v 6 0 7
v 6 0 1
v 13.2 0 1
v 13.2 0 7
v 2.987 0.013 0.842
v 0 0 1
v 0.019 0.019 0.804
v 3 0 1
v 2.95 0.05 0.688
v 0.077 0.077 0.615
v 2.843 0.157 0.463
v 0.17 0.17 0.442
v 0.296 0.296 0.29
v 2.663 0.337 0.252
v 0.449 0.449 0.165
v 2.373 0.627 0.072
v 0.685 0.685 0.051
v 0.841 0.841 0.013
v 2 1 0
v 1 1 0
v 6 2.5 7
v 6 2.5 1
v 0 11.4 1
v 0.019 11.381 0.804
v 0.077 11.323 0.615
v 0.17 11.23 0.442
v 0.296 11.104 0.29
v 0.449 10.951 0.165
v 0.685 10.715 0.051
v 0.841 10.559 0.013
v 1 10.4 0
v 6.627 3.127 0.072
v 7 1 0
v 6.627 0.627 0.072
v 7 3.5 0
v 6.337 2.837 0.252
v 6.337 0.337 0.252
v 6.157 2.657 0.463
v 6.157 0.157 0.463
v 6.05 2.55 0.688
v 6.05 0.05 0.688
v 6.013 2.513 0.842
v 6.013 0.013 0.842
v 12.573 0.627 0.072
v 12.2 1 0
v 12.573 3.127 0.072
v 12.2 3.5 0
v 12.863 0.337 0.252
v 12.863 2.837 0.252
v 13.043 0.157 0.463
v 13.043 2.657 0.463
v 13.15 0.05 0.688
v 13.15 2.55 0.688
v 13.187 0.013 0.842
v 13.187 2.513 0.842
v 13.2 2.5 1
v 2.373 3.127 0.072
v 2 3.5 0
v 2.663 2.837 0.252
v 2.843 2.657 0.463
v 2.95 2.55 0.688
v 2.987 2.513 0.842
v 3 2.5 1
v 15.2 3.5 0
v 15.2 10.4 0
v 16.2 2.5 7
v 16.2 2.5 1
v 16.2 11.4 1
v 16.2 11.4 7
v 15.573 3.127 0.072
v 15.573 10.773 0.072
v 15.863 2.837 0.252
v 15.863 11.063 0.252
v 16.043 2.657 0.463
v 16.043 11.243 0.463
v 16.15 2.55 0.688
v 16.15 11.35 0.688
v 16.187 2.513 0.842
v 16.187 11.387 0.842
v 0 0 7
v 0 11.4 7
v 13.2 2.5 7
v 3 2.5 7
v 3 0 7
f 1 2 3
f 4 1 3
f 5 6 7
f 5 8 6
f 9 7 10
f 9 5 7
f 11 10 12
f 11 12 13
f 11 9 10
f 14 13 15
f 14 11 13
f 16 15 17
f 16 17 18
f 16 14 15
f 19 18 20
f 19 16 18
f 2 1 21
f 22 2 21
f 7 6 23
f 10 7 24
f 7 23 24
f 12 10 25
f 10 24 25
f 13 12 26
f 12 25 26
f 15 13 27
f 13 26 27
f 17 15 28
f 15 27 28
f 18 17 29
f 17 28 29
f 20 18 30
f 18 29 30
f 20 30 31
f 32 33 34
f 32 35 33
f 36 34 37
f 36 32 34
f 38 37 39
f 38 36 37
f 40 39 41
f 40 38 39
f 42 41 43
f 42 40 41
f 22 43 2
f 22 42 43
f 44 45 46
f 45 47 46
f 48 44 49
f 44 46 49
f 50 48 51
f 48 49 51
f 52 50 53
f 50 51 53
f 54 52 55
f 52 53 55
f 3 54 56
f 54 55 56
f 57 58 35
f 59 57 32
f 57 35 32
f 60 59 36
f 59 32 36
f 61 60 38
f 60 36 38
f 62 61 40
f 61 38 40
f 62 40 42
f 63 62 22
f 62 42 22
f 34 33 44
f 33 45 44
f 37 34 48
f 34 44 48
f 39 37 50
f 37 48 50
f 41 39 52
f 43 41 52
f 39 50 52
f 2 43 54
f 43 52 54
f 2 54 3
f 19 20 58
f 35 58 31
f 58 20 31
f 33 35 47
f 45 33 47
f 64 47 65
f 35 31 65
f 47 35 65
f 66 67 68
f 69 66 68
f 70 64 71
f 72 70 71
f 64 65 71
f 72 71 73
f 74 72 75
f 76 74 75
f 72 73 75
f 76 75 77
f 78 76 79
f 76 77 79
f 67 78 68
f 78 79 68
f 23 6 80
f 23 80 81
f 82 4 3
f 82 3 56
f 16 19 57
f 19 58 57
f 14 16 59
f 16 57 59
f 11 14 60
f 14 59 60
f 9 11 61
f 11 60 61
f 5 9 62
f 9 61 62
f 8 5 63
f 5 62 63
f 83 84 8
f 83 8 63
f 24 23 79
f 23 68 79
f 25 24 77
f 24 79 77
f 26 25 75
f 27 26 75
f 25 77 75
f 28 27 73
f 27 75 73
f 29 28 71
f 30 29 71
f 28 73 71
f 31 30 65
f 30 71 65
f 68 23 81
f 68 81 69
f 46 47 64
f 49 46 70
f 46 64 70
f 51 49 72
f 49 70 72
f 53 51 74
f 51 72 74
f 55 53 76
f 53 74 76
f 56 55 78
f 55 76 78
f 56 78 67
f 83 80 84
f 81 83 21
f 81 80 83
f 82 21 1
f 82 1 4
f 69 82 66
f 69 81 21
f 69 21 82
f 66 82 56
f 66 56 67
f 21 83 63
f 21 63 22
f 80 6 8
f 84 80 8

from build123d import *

# Parameters (mm, degrees)
SKICA1_W                 = 16.2
SKICA1_H                 = 11.4
P_IDAT_VYSUNUT_M1_DEPTH  = 7
SKICA2_W                 = 3
SKICA2_H                 = 2.5
ODEBRAT_VYSUNUT_M1_DEPTH = 8
ZAOBLIT5_R               = 1


with BuildPart() as part:
    # Skica1 → Přidat vysunutím1 (new body)
    with BuildSketch(Plane.XY):
        with Locations((8.1, 5.7)):
            Rectangle(SKICA1_W, SKICA1_H)
    extrude(amount=P_IDAT_VYSUNUT_M1_DEPTH)

    # Skica2 → Odebrat vysunutím1 (cut, through all)
    with BuildSketch(Plane.XY.offset(7)):
        with Locations((4.5, 1.25)):
            Rectangle(SKICA2_W, SKICA2_H)
        with Locations((14.7, 1.25)):
            Rectangle(SKICA2_W, SKICA2_H)
    extrude(amount=-ODEBRAT_VYSUNUT_M1_DEPTH, mode=Mode.SUBTRACT)

    # Zaoblit5
    zaoblit5_edges = [part.edges().sort_by_distance(p)[0] for p in [
        (16.2, 6.95, 0),
        (9.6, 0, 0),
        (6, 1.25, 0),
        (3, 1.25, 0),
        (4.5, 2.5, 0),
        (14.7, 2.5, 0),
        (13.2, 1.25, 0),
        (8.1, 11.4, 0),
        (1.5, 0, 0),
        (0, 5.7, 0),
    ]]
    fillet(zaoblit5_edges, radius=ZAOBLIT5_R)


solid = part.part
